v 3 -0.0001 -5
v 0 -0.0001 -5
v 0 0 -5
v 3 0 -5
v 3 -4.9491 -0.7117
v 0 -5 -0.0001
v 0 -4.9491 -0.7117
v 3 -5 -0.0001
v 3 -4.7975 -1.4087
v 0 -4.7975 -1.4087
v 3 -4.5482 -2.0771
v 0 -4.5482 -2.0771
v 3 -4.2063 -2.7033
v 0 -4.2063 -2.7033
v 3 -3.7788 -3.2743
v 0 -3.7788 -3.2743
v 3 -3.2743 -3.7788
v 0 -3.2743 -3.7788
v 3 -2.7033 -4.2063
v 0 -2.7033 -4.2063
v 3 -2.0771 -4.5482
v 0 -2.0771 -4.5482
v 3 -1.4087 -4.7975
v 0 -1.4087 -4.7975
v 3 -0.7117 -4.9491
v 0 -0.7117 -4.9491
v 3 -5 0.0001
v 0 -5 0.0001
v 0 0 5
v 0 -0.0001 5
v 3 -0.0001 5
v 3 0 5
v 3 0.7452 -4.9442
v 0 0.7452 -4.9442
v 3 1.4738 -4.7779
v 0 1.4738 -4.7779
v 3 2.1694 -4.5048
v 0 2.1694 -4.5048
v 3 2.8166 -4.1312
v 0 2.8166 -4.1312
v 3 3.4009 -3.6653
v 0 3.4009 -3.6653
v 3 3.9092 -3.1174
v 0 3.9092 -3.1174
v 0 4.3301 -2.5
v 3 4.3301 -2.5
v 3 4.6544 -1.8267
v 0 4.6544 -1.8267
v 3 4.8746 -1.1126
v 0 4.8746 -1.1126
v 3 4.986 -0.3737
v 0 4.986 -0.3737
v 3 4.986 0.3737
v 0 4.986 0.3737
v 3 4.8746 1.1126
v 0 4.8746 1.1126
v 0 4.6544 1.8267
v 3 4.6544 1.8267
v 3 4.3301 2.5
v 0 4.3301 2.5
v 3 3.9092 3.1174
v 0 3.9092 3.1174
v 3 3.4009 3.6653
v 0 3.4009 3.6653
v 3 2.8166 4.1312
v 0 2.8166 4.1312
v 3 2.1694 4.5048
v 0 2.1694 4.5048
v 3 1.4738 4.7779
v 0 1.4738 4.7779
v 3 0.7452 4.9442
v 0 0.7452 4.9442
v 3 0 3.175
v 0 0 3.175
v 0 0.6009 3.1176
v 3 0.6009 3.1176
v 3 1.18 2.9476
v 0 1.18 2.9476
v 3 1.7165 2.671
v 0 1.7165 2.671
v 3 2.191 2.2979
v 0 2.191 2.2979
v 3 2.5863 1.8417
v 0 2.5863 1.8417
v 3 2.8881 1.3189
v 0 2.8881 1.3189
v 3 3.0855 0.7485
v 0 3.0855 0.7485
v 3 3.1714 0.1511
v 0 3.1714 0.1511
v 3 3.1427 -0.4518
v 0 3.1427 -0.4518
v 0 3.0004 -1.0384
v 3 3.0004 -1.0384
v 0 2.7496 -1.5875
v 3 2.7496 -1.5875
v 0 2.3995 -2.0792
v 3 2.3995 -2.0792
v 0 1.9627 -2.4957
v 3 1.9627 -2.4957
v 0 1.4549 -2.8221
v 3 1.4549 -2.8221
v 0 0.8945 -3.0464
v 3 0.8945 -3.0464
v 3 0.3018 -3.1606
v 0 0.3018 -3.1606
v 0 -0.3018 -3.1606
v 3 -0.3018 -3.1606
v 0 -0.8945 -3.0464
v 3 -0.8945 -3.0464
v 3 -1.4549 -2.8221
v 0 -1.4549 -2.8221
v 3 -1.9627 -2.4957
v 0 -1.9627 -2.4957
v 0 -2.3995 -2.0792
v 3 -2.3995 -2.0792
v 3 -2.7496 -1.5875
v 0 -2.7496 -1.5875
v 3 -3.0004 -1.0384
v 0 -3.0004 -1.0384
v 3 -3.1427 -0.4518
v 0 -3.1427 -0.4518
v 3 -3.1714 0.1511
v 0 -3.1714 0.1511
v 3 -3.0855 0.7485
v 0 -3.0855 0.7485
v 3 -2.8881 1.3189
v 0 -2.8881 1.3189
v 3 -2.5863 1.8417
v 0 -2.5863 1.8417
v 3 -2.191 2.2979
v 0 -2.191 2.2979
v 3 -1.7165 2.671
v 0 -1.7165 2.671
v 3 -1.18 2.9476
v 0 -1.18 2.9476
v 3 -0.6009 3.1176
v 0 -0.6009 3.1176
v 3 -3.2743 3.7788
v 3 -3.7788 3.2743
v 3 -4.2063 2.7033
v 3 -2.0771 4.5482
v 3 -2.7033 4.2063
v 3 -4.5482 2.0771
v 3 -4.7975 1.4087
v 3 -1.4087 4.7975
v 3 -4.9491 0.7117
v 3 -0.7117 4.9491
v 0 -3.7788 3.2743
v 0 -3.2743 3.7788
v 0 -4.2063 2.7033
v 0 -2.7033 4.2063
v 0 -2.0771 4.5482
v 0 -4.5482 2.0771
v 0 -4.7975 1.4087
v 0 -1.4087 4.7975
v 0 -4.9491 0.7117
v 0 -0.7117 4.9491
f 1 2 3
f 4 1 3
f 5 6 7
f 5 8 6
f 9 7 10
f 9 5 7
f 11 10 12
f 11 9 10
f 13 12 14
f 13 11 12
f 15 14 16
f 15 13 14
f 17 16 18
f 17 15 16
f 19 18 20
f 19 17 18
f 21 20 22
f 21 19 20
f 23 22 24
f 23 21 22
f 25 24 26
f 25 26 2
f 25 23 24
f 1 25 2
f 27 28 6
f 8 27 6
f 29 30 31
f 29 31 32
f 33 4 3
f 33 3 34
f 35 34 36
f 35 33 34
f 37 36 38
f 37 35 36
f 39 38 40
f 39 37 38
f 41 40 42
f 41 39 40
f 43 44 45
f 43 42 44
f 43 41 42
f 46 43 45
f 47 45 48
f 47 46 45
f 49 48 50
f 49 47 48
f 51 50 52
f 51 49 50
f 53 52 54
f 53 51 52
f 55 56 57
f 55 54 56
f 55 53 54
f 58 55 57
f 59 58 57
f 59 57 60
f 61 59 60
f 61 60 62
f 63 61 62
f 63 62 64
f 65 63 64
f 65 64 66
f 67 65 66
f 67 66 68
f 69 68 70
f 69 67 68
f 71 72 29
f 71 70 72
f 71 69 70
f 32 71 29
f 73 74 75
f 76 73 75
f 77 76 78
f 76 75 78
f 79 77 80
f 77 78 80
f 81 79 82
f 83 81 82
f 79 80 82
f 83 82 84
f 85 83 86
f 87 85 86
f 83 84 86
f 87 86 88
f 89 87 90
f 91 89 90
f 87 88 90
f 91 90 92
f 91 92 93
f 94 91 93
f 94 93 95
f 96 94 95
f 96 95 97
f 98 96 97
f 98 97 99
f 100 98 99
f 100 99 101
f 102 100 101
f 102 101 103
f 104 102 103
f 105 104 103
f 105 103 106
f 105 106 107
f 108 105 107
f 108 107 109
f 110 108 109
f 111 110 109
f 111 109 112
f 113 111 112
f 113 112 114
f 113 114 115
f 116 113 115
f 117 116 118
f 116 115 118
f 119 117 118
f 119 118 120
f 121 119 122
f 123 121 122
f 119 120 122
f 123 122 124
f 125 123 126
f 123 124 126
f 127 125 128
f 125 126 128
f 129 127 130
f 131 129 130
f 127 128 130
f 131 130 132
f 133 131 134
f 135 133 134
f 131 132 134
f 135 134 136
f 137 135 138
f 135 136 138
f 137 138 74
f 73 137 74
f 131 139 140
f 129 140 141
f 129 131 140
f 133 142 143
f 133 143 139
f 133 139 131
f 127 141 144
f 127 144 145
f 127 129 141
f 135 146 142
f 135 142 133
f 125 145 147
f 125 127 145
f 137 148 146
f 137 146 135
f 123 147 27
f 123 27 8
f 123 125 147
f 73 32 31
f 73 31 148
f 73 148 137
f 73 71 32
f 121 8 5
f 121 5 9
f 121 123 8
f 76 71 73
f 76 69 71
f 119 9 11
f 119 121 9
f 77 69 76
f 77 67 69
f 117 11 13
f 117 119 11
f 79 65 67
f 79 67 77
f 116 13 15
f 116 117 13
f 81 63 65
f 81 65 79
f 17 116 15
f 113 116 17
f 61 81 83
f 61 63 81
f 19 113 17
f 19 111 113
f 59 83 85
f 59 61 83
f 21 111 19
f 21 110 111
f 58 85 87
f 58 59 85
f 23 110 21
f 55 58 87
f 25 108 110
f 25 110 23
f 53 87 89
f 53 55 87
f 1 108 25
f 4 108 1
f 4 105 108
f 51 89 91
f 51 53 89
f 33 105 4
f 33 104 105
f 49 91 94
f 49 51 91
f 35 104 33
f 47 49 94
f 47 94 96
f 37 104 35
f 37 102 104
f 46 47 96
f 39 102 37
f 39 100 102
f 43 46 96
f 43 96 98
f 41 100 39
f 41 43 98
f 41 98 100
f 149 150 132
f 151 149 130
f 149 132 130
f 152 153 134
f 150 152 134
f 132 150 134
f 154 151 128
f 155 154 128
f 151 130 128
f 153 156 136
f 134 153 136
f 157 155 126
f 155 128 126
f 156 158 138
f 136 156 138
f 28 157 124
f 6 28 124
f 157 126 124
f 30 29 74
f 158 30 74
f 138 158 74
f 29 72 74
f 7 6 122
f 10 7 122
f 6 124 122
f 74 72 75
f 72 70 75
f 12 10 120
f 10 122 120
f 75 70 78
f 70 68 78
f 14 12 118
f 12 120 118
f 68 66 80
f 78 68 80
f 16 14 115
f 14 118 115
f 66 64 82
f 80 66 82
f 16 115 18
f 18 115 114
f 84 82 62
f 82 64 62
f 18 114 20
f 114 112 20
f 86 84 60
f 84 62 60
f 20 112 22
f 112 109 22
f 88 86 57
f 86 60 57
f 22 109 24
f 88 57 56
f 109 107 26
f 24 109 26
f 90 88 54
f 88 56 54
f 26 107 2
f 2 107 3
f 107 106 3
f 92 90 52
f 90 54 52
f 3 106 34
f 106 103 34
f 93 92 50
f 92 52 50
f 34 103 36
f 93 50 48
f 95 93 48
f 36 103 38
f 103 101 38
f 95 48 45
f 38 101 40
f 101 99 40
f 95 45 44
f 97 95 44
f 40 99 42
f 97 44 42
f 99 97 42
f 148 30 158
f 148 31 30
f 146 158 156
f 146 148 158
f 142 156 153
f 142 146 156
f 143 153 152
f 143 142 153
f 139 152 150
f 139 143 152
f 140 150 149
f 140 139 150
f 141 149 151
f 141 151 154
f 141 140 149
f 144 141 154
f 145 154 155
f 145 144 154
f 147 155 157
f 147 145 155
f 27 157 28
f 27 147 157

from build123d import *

# Parameters (mm, degrees)
SKETCH1_W           = 10
SKETCH1_H           = 10
BOSS_EXTRUDE1_DEPTH = 3
SKETCH2_R           = 3.175
CUT_EXTRUDE1_DEPTH  = 10
FILLET1_RADIUS      = 5
FILLET1_LENGTH      = 3
FILLET2_R           = 5


with BuildPart() as part:
    # Sketch1 → Boss-Extrude1 (new body)
    with BuildSketch(Plane(origin=(0, 0, 0), x_dir=(0, 0, -1), z_dir=(1, 0, 0))):
        Rectangle(SKETCH1_W, SKETCH1_H)
    extrude(amount=BOSS_EXTRUDE1_DEPTH)

    # Sketch2 → Cut-Extrude1 (cut)
    with BuildSketch(Plane.ZY):
        Circle(SKETCH2_R)
    extrude(amount=-CUT_EXTRUDE1_DEPTH, mode=Mode.SUBTRACT)

    # Fillet1: full round fillet: the end face becomes a half cylinder, R = half its width
    fillet1_face = Plane((1.5, 5, 0), x_dir=(1, 0, 0), z_dir=(0, 1, 0))  # on the end face: x along it, z out of the body
    fillet1_slab = fillet1_face.offset(-FILLET1_RADIUS / 2) * Box(FILLET1_LENGTH, 2 * FILLET1_RADIUS, FILLET1_RADIUS, mode=Mode.PRIVATE)  # the body's end, R deep
    fillet1_round = Plane((1.5, 0, 0), x_dir=(0, 1, 0), z_dir=(1, 0, 0)) * Cylinder(FILLET1_RADIUS, FILLET1_LENGTH, mode=Mode.PRIVATE)  # its axis R under the face
    add(fillet1_slab - fillet1_round, mode=Mode.SUBTRACT)

    # Fillet2
    fillet2_edges = [part.edges().sort_by_distance(p)[0] for p in [
        (1.5, -5, -5),
        (1.5, -5, 5),
    ]]
    fillet(fillet2_edges, radius=FILLET2_R - 0.0001)  # a hair under: the kernel refuses the full size


solid = part.part
